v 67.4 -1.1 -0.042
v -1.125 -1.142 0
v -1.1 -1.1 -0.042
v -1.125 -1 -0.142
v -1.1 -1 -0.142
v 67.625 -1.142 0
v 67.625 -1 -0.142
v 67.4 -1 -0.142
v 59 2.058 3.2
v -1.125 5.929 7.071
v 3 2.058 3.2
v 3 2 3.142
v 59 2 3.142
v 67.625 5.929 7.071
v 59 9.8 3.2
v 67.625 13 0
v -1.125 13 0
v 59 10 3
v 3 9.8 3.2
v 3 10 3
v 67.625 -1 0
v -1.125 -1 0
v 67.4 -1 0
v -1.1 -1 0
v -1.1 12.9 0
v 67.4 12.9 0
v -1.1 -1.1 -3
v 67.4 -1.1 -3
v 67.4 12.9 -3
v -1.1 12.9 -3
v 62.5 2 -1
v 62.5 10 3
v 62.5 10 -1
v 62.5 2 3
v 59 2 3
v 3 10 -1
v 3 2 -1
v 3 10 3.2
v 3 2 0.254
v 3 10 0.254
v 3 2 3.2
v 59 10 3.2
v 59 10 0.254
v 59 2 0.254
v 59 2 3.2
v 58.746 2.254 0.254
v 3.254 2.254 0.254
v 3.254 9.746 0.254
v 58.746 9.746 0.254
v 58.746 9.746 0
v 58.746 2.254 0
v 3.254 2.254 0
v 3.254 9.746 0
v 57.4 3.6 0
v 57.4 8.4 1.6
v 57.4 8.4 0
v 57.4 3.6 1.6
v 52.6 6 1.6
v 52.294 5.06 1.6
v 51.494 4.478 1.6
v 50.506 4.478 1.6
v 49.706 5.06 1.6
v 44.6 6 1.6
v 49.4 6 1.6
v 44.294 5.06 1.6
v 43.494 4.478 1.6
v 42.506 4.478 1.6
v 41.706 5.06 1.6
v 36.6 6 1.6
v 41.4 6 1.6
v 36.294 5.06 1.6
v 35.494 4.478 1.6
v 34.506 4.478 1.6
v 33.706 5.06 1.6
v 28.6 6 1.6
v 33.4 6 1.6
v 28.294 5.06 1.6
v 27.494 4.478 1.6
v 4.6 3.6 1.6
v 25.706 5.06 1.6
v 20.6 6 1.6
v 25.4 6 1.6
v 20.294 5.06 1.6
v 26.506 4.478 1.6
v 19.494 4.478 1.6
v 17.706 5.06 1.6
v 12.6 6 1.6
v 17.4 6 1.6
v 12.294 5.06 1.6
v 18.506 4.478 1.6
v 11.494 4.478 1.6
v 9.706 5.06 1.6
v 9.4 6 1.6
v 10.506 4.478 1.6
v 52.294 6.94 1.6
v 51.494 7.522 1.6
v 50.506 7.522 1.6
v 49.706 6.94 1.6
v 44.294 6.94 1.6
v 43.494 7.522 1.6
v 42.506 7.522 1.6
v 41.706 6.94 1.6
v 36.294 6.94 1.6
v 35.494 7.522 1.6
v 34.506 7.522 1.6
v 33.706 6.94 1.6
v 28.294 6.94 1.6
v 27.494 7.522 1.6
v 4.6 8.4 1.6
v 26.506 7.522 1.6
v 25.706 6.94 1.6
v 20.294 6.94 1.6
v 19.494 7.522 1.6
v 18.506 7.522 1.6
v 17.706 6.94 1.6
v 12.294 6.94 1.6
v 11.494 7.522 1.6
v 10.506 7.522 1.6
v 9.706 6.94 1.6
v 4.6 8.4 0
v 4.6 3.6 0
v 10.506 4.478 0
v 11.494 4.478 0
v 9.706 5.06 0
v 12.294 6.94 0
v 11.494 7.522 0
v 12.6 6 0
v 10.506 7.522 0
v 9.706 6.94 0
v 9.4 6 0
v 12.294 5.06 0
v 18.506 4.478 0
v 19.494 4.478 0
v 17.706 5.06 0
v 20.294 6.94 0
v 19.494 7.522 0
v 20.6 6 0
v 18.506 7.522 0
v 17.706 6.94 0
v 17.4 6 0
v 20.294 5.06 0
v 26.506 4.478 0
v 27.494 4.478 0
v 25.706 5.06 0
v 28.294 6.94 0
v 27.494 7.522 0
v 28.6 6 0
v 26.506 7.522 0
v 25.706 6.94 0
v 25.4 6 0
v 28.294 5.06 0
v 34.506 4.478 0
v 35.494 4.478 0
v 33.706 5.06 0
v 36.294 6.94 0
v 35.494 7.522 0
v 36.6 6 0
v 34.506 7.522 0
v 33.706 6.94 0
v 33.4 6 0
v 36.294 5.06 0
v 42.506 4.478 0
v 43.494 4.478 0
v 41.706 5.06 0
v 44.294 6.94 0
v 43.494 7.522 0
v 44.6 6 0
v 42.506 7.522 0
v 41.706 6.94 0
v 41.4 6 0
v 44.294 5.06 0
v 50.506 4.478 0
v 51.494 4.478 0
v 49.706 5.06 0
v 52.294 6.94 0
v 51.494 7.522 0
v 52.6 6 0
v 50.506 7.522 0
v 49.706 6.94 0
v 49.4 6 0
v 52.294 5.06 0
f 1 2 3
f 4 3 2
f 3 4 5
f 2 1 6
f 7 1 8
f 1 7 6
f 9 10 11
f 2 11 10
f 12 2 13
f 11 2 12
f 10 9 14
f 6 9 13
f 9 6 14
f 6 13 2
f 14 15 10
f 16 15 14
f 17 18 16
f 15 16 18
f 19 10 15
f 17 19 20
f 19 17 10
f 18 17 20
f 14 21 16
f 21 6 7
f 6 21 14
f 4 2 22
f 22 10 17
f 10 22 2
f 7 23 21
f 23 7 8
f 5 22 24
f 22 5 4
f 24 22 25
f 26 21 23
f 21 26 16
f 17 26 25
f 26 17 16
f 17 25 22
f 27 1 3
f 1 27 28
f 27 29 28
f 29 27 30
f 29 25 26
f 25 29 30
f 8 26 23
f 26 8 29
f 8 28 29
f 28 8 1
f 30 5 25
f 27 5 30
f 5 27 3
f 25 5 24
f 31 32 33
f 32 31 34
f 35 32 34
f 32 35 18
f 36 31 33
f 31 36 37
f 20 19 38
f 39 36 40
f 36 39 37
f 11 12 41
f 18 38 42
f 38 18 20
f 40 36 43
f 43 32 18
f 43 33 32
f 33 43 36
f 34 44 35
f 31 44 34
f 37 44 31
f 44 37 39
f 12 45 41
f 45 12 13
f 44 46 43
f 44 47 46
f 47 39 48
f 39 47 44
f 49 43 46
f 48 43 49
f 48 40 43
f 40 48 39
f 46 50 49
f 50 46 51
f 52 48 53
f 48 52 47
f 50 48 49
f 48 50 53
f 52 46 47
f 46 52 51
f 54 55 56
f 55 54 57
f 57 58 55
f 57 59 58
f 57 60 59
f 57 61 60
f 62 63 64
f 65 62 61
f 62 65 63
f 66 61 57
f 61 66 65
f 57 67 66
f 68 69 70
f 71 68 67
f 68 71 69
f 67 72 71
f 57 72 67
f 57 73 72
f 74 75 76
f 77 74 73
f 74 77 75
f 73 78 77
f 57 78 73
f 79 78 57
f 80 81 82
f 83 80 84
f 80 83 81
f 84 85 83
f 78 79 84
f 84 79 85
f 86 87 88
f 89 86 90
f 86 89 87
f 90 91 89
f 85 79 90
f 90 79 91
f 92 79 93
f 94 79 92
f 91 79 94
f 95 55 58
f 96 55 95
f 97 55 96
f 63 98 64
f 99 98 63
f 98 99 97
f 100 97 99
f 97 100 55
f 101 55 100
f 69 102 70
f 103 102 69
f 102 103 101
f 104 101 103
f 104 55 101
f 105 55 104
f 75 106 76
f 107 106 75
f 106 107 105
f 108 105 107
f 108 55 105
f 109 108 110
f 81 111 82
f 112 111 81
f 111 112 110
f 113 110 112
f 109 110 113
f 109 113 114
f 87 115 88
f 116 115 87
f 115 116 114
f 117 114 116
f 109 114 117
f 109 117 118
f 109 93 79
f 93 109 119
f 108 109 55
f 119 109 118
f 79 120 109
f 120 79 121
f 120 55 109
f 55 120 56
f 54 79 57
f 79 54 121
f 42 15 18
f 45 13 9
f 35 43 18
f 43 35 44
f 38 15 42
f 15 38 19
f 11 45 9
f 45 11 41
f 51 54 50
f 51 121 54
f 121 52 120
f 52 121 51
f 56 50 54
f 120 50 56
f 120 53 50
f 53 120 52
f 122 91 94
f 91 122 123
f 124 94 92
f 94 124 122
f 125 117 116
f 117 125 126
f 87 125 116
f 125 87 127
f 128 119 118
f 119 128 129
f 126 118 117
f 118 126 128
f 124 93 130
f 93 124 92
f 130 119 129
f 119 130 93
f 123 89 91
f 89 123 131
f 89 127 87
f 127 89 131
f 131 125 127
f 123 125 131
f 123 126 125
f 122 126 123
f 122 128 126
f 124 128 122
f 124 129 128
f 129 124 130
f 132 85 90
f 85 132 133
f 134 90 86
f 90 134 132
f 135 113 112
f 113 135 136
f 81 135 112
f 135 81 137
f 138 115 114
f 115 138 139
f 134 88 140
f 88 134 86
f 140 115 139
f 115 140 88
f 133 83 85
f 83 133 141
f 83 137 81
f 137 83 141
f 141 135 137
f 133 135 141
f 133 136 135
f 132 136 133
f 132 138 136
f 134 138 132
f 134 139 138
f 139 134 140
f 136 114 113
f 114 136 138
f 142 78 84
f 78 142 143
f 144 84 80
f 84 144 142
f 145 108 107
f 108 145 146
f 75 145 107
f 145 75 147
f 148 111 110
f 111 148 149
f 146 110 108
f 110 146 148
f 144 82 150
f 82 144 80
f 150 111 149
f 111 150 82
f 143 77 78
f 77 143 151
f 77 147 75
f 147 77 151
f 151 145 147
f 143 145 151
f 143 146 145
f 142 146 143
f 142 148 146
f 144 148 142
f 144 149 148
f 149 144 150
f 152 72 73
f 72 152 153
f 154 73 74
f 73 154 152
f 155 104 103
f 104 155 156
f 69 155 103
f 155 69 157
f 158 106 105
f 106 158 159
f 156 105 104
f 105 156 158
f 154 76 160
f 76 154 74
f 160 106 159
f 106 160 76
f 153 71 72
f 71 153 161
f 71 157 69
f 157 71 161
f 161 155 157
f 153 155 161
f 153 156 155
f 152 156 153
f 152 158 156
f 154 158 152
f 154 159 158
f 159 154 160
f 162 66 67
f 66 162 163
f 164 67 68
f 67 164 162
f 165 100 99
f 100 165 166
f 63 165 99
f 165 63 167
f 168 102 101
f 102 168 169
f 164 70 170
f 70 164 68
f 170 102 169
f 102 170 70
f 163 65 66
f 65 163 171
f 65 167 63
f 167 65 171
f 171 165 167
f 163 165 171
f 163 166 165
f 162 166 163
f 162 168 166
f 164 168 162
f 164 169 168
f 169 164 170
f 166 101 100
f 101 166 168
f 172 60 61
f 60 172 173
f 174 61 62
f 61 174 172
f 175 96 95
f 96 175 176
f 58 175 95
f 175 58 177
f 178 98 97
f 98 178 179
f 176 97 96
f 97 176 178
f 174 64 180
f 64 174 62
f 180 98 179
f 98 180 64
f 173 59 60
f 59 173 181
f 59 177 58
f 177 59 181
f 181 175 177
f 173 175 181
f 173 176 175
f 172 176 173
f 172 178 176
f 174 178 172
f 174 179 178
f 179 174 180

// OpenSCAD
// file: ../OpenSCAD/brailleAndText.scad
/*
Braille Module
http://creativecommons.org/licenses/by/3.0/
*/


// mm sizes from http://dots.physics.orst.edu/gs_layout.html
radius = 0.25;
spacing = 2.5;
startOffset = 3.75;
distance = startOffset + spacing;

plate_height = 10;
plate_thickness = 10;   // was 2.

$fn = 10;



module letter(bitmap, char) {
//    echo(char);
	row_size = 2;
	col_size = 3;
	bitmap_size = row_size * col_size;
	
	function loc_x(loc) = floor(loc / row_size) * spacing + spacing;
	function loc_y(loc) = loc % row_size * spacing  + (distance-spacing)/2;

    translate([0, loc_y(-1), -2]) {
        rotate([270, 0, 90]) {
            linear_extrude(height = 1.25)
            text(char, 6);
        }
    }
	
    for (loc = [0:bitmap_size - 1]) {
		if (bitmap[loc] != 0) {
			union() {
				translate(v = [loc_x(loc), loc_y(loc), 0]) {
					sphere(radius = radius* bitmap[loc], center = true);
				}
			}
		}
	}
}


module braille_char(char) {
	if (char == "A" || char == "a") {
		letter([
			1,0,
			0,0,
			0,0
		], char);
	} else if (char == "B" || char == "b") {
		letter([
			1,0,
			1,0,
			0,0
		], char);
	} else if (char == "C" || char == "c") {
		letter([
			1,1,
			0,0,
			0,0
		], char);
	} else if (char == "D" || char == "d") {
		letter([
			1,1,
			0,1,
			0,0
		], char);
	} else if (char == "E" || char == "e") {
		letter([
			1,0,
			0,1,
			0,0
		], char);
	} else if (char == "F" || char == "f") {
		letter([
			1,1,
			1,0,
			0,0
		], char);
	} else if (char == "G" || char == "g") {
		letter([
			1,1,
			1,1,
			0,0
		], char);
	} else if (char == "H" || char == "h") {
		letter([
			1,0,
			1,1,
			0,0
		], char);
	} else if (char == "I" || char == "i") {
		letter([
			0,1,
			1,0,
			0,0
		], char);
	} else if (char == "J" || char == "j") {
		letter([
			0,1,
			1,1,
			0,0
		], char);
	} else if (char == "K" || char == "k") {
		letter([
			1,0,
			0,0,
			1,0
		], char);
	} else if (char == "L" || char == "l") {
		letter([
			1,0,
			1,0,
			1,0
		], char);
	} else if (char == "M" || char == "m") {
		letter([
			1,1,
			0,0,
			1,0
		], char);
	} else if (char == "N" || char == "n") {
		letter([
			1,1,
			0,1,
			1,0
		], char);
	} else if (char == "O" || char == "o") {
		letter([
			1,0,
			0,1,
			1,0
		], char);
	} else if (char == "P" || char == "p") {
		letter([
			1,1,
			1,0,
			1,0
		], char);
	} else if (char == "Q" || char == "q") {
		letter([
			1,1,
			1,1,
			1,0
		], char);
	} else if (char == "R" || char == "r") {
		letter([
			1,0,
			1,1,
			1,0
		], char);
	} else if (char == "S" || char == "s") {
		letter([
			0,1,
			1,0,
			1,0
		], char);
	} else if (char == "T" || char == "t") {
		letter([
			0,1,
			1,1,
			1,0
		], char);
	} else if (char == "U" || char == "u") {
		letter([
			1,0,
			0,0,
			1,1
		], char);
	} else if (char == "V" || char == "v") {
		letter([
			1,0,
			1,1,
			1,0
		], char);
	} else if (char == "W" || char == "w") {
		letter([
			0,1,
			1,1,
			0,1
		], char);
	} else if (char == "X" || char == "x") {
		letter([
			1,1,
			0,0,
			1,1
		], char);
	} else if (char == "Y" || char == "y") {
		letter([
			1,1,
			0,1,
			1,1
		], char);
	} else if (char == "Z" || char == "z") {
		letter([
			1,0,
			0,1,
			1,1
		], char);
    } else if (char == " ") {
		letter([
			0,0,
			0,0,
			0,0
		], char);
	} else {
		echo("Invalid Character: ", char);
	}

}

module braille_str(chars) {
    char_count = len(chars);
	echo(str("Total Width of ", chars, " : ",  distance * char_count, "mm"));
	union() {
		for (count = [0:char_count-1]) {
			translate(v = [0, count * distance, plate_thickness]) {
				braille_char(chars[count]);
			}
		}
		translate(v = [0, -distance/2, 0]) {
			color([0,0,1]) {
				cube(size = [plate_height, distance * (char_count+1), plate_thickness]);
			}
            }                                                      
	}
}

function lenText(txt="Hi") = distance * len(txt);

module printTextAndBraille(textToPrint) {
    blockLen = lenText(textToPrint);
    union()
    {
        difference() {                      // remove second box from first
            rotate([0,45,0]) {              // make it on its edge
                braille_str((textToPrint)); // make a long box
            }
            translate([0, -3.25, -8]) {     // move in right place
                cube(size = [14, (blockLen+8), 8]);
            }
        } 
        translate([0.1, -3.1, -3]) {     // move in right place
            cube(size = [14, (blockLen+6), 3]); 
        }
    }                                 
}

printTextAndBraille("HELLO CalLUM");
// file: ../openSCADLibs/lego_brick_builder.scad
/*

 Basic Lego brick builder module for OpenScad by Jorg Janssen 2013 (CC BY-NC 3.0) 
 To use this in your own projects add:

 use <path_to_this_file/lego_brick_builder.scad>
 brick (length, width, height [,smooth]);

 Length and width are in standard lego brick dimensions. 
 Height is in flat brick heights, so for a normal lego brick height = 3.
 Add optional smooth = true for a brick without studs. 
 Use height = 0 to just put studs/knobs on top of other things.

 */
$fn = 150;

// and this is how it's done:

FLU = 1.6; // Fundamental Lego Unit = 1.6 mm

BRICK_WIDTH = 5*FLU; // basic brick width
BRICK_HEIGHT = 6*FLU; // basic brick height
PLATE_HEIGHT = 2*FLU; // basic plate height
WALL_THICKNESS = FLU; // outer wall of the brick
STUD_RADIUS = 1.5*FLU; // studs are the small cylinders on top of the brick with the lego logo ('nopje' in Dutch)
STUD_HEIGHT = FLU; 
ANTI_STUD_RADIUS = 0.5*4.07*FLU;  // an anti stud is the hollow cylinder inside bricks that have length > 1 and width > 1
PIN_RADIUS = FLU; // a pin is the small cylinder inside bricks that have length = 1 or width = 1
SUPPORT_THICKNESS = 0.254; // support is the thin surface between anti studs, pins and walls, your printer might not print this thin, try thicker!
EDGE = 0.254; // this is the width and height of the bottom line edge of smooth bricks
CORRECTION = 0.1; // addition to each size, to make sure all parts connect by moving them a little inside each other

module brick(length = 4, width = 2, height = 3, smooth = false){

	// brick shell
	difference(){
		cube(size = [length*BRICK_WIDTH,width*BRICK_WIDTH,height*PLATE_HEIGHT]);
		translate([WALL_THICKNESS,WALL_THICKNESS,-WALL_THICKNESS])
		union(){
			cube(size = [length*BRICK_WIDTH-2*WALL_THICKNESS,width*BRICK_WIDTH-2*WALL_THICKNESS,height*PLATE_HEIGHT]);
			// stud inner holes, radius = pin radius
			if (!smooth) {
				translate([STUD_RADIUS+WALL_THICKNESS,STUD_RADIUS+WALL_THICKNESS,height*PLATE_HEIGHT])
				for (y = [0:width-1]){
					for (x = [0:length-1]){
						translate ([x*BRICK_WIDTH-WALL_THICKNESS,y*BRICK_WIDTH-WALL_THICKNESS,-CORRECTION])
						cylinder(h=WALL_THICKNESS+2*CORRECTION,r=PIN_RADIUS);
					}
				}
			}
			// small bottom line edge for smooth bricks
			else {
				translate([-WALL_THICKNESS-CORRECTION,-WALL_THICKNESS-CORRECTION,FLU-CORRECTION]) 
				difference() {
					cube([length*BRICK_WIDTH+2*CORRECTION,width*BRICK_WIDTH+2*CORRECTION,EDGE+CORRECTION]);
					translate([EDGE+CORRECTION,EDGE+CORRECTION,-CORRECTION])
					cube([length*BRICK_WIDTH-2*EDGE,width*BRICK_WIDTH-2*EDGE,EDGE+3*CORRECTION]); 
				}
			}
		}
	}
	// Studs
	if(!smooth){
		translate([STUD_RADIUS+WALL_THICKNESS,STUD_RADIUS+WALL_THICKNESS,height*PLATE_HEIGHT])
		for (y = [0:width-1]){
			for (x = [0:length-1]){
				translate ([x*BRICK_WIDTH,y*BRICK_WIDTH,-CORRECTION])
				difference(){
					cylinder(h=STUD_HEIGHT+CORRECTION, r=STUD_RADIUS);
					// Stud inner holes
					translate([0,0,-CORRECTION])
					cylinder(h=0.5*STUD_HEIGHT+CORRECTION,r=PIN_RADIUS);
				}
				// tech logo - disable this if your printer isn't capable of printing this small
				if ( length > width){
					translate([x*BRICK_WIDTH+0.8,y*BRICK_WIDTH-1.9,STUD_HEIGHT-CORRECTION])
					resize([1.2*1.7,2.2*1.7,0.254+CORRECTION])
					rotate(a=[0,0,90])
					import("tech.stl");
				}
				else {
					translate([x*BRICK_WIDTH-1.9,y*BRICK_WIDTH-0.8,STUD_HEIGHT-CORRECTION])
					resize([2.2*1.7,1.2*1.7,0.254+CORRECTION])
					import("tech.stl");				
				}				
				/* 
				// Alternative 2-square logo
				translate ([x*BRICK_WIDTH+CORRECTION,y*BRICK_WIDTH-CORRECTION,STUD_HEIGHT-CORRECTION])		
				cube([1,1,2*CORRECTION]);
				translate ([x*BRICK_WIDTH-0.9,y*BRICK_WIDTH-0.9,STUD_HEIGHT-CORRECTION])		
				cube([1,1,0.3]);
				*/				
			}
		}
	}
	// Pins x
	if (width == 1 && length > 1) {	
			for (x = [1:length-1]){
				translate([x*BRICK_WIDTH,0.5*BRICK_WIDTH,0])
				cylinder(h=height*PLATE_HEIGHT-WALL_THICKNESS+CORRECTION,r=PIN_RADIUS);
				// Supports
				if (height > 1) {
				translate([x*BRICK_WIDTH-0.5*SUPPORT_THICKNESS,CORRECTION,STUD_HEIGHT])
				cube(size=[SUPPORT_THICKNESS,BRICK_WIDTH-2*CORRECTION,height*PLATE_HEIGHT-STUD_HEIGHT-WALL_THICKNESS+CORRECTION]);
			}
		}
	}
	// Pins y
	if (length == 1 && width > 1) {	
			for (y = [1:width-1]){
			translate([0.5*BRICK_WIDTH,y*BRICK_WIDTH,0])
			cylinder(h=height*PLATE_HEIGHT-WALL_THICKNESS+CORRECTION,r=PIN_RADIUS);
			// Supports
			if (height > 1) {
			translate([CORRECTION,y*BRICK_WIDTH-0.5*SUPPORT_THICKNESS,STUD_HEIGHT])
			cube(size=[BRICK_WIDTH-2*CORRECTION,SUPPORT_THICKNESS,height*PLATE_HEIGHT-STUD_HEIGHT-WALL_THICKNESS+CORRECTION]);}
			
		}
	}
	// Anti Studs
	if (width > 1 && length > 1){
		difference(){
			union(){
				for(y = [1:width-1]){
					for(x = [1:length-1]){
						// anti studs
						translate([x*BRICK_WIDTH,y*BRICK_WIDTH,0])
						cylinder (h=height*PLATE_HEIGHT-WALL_THICKNESS+CORRECTION, r = ANTI_STUD_RADIUS);
						// Supports
						if (height > 1){
							// Support x
							if (x%2 == 0 && (length%2 == 0 || length%4 == 1 && x<length/2 || length%4 == 3 && x>length/2) || x%2 == 1 && (length%4 == 3 && x<length/2 || length%4 == 1 && x>length/2)) {
								translate([BRICK_WIDTH*x-0.5*SUPPORT_THICKNESS,y*BRICK_WIDTH-BRICK_WIDTH+WALL_THICKNESS-CORRECTION,STUD_HEIGHT])
								cube(size=[SUPPORT_THICKNESS,2*BRICK_WIDTH-2*WALL_THICKNESS,height*PLATE_HEIGHT-STUD_HEIGHT-WALL_THICKNESS+CORRECTION]);
							}
							// Supports y							
							if (y%2 == 0 && (width%2 == 0 || width%4 == 1 && y<width/2 || width%4 == 3 && y>width/2) || y%2 == 1 && (width%4 == 3 && y<width/2 || width%4 == 1 && y>width/2)) {
								translate([x*BRICK_WIDTH-BRICK_WIDTH+WALL_THICKNESS-CORRECTION,BRICK_WIDTH*y-0.5*SUPPORT_THICKNESS,STUD_HEIGHT])
								cube(size=[2*BRICK_WIDTH-2*WALL_THICKNESS,SUPPORT_THICKNESS,height*PLATE_HEIGHT-STUD_HEIGHT-WALL_THICKNESS+CORRECTION]);
							}
						}
					}
				}
			}
			union(){
				for(y = [1:width-1]){
					for(x = [1:length-1]){
						// hollow anti studs
						translate([x*BRICK_WIDTH,y*BRICK_WIDTH,-WALL_THICKNESS])
						cylinder (h=height*PLATE_HEIGHT, r = STUD_RADIUS);				
					}
				}
			}
		}		
	}
}
	
// file: ../OpenSCAD/TextAndBrailleLegoBlock.scad
 include <../openSCADLibs/lego_brick_builder.scad>
 include <../OpenSCAD/brailleAndText.scad>;

module brickAndText(text) {
    txtLen = distance * len(text);
    echo(distance);
    difference() {
        rotate([180,180,90])
            translate([-13, 2, 0])
                printTextAndBraille(text);
        translate([3, 2, -1]) 
            cube([txtLen - 3, BRICK_WIDTH, 4]);
    }
    translate([3,2,0])
        brick(floor(txtLen / BRICK_WIDTH),1,1, true);    
}

// use <../BPNodesV2/TextNBraille.scad>
//brickAndText("This is a test string");  
// main file
use <../OpenSCAD/TextAndBrailleLegoBlock.scad>

brickAndText("          ");
